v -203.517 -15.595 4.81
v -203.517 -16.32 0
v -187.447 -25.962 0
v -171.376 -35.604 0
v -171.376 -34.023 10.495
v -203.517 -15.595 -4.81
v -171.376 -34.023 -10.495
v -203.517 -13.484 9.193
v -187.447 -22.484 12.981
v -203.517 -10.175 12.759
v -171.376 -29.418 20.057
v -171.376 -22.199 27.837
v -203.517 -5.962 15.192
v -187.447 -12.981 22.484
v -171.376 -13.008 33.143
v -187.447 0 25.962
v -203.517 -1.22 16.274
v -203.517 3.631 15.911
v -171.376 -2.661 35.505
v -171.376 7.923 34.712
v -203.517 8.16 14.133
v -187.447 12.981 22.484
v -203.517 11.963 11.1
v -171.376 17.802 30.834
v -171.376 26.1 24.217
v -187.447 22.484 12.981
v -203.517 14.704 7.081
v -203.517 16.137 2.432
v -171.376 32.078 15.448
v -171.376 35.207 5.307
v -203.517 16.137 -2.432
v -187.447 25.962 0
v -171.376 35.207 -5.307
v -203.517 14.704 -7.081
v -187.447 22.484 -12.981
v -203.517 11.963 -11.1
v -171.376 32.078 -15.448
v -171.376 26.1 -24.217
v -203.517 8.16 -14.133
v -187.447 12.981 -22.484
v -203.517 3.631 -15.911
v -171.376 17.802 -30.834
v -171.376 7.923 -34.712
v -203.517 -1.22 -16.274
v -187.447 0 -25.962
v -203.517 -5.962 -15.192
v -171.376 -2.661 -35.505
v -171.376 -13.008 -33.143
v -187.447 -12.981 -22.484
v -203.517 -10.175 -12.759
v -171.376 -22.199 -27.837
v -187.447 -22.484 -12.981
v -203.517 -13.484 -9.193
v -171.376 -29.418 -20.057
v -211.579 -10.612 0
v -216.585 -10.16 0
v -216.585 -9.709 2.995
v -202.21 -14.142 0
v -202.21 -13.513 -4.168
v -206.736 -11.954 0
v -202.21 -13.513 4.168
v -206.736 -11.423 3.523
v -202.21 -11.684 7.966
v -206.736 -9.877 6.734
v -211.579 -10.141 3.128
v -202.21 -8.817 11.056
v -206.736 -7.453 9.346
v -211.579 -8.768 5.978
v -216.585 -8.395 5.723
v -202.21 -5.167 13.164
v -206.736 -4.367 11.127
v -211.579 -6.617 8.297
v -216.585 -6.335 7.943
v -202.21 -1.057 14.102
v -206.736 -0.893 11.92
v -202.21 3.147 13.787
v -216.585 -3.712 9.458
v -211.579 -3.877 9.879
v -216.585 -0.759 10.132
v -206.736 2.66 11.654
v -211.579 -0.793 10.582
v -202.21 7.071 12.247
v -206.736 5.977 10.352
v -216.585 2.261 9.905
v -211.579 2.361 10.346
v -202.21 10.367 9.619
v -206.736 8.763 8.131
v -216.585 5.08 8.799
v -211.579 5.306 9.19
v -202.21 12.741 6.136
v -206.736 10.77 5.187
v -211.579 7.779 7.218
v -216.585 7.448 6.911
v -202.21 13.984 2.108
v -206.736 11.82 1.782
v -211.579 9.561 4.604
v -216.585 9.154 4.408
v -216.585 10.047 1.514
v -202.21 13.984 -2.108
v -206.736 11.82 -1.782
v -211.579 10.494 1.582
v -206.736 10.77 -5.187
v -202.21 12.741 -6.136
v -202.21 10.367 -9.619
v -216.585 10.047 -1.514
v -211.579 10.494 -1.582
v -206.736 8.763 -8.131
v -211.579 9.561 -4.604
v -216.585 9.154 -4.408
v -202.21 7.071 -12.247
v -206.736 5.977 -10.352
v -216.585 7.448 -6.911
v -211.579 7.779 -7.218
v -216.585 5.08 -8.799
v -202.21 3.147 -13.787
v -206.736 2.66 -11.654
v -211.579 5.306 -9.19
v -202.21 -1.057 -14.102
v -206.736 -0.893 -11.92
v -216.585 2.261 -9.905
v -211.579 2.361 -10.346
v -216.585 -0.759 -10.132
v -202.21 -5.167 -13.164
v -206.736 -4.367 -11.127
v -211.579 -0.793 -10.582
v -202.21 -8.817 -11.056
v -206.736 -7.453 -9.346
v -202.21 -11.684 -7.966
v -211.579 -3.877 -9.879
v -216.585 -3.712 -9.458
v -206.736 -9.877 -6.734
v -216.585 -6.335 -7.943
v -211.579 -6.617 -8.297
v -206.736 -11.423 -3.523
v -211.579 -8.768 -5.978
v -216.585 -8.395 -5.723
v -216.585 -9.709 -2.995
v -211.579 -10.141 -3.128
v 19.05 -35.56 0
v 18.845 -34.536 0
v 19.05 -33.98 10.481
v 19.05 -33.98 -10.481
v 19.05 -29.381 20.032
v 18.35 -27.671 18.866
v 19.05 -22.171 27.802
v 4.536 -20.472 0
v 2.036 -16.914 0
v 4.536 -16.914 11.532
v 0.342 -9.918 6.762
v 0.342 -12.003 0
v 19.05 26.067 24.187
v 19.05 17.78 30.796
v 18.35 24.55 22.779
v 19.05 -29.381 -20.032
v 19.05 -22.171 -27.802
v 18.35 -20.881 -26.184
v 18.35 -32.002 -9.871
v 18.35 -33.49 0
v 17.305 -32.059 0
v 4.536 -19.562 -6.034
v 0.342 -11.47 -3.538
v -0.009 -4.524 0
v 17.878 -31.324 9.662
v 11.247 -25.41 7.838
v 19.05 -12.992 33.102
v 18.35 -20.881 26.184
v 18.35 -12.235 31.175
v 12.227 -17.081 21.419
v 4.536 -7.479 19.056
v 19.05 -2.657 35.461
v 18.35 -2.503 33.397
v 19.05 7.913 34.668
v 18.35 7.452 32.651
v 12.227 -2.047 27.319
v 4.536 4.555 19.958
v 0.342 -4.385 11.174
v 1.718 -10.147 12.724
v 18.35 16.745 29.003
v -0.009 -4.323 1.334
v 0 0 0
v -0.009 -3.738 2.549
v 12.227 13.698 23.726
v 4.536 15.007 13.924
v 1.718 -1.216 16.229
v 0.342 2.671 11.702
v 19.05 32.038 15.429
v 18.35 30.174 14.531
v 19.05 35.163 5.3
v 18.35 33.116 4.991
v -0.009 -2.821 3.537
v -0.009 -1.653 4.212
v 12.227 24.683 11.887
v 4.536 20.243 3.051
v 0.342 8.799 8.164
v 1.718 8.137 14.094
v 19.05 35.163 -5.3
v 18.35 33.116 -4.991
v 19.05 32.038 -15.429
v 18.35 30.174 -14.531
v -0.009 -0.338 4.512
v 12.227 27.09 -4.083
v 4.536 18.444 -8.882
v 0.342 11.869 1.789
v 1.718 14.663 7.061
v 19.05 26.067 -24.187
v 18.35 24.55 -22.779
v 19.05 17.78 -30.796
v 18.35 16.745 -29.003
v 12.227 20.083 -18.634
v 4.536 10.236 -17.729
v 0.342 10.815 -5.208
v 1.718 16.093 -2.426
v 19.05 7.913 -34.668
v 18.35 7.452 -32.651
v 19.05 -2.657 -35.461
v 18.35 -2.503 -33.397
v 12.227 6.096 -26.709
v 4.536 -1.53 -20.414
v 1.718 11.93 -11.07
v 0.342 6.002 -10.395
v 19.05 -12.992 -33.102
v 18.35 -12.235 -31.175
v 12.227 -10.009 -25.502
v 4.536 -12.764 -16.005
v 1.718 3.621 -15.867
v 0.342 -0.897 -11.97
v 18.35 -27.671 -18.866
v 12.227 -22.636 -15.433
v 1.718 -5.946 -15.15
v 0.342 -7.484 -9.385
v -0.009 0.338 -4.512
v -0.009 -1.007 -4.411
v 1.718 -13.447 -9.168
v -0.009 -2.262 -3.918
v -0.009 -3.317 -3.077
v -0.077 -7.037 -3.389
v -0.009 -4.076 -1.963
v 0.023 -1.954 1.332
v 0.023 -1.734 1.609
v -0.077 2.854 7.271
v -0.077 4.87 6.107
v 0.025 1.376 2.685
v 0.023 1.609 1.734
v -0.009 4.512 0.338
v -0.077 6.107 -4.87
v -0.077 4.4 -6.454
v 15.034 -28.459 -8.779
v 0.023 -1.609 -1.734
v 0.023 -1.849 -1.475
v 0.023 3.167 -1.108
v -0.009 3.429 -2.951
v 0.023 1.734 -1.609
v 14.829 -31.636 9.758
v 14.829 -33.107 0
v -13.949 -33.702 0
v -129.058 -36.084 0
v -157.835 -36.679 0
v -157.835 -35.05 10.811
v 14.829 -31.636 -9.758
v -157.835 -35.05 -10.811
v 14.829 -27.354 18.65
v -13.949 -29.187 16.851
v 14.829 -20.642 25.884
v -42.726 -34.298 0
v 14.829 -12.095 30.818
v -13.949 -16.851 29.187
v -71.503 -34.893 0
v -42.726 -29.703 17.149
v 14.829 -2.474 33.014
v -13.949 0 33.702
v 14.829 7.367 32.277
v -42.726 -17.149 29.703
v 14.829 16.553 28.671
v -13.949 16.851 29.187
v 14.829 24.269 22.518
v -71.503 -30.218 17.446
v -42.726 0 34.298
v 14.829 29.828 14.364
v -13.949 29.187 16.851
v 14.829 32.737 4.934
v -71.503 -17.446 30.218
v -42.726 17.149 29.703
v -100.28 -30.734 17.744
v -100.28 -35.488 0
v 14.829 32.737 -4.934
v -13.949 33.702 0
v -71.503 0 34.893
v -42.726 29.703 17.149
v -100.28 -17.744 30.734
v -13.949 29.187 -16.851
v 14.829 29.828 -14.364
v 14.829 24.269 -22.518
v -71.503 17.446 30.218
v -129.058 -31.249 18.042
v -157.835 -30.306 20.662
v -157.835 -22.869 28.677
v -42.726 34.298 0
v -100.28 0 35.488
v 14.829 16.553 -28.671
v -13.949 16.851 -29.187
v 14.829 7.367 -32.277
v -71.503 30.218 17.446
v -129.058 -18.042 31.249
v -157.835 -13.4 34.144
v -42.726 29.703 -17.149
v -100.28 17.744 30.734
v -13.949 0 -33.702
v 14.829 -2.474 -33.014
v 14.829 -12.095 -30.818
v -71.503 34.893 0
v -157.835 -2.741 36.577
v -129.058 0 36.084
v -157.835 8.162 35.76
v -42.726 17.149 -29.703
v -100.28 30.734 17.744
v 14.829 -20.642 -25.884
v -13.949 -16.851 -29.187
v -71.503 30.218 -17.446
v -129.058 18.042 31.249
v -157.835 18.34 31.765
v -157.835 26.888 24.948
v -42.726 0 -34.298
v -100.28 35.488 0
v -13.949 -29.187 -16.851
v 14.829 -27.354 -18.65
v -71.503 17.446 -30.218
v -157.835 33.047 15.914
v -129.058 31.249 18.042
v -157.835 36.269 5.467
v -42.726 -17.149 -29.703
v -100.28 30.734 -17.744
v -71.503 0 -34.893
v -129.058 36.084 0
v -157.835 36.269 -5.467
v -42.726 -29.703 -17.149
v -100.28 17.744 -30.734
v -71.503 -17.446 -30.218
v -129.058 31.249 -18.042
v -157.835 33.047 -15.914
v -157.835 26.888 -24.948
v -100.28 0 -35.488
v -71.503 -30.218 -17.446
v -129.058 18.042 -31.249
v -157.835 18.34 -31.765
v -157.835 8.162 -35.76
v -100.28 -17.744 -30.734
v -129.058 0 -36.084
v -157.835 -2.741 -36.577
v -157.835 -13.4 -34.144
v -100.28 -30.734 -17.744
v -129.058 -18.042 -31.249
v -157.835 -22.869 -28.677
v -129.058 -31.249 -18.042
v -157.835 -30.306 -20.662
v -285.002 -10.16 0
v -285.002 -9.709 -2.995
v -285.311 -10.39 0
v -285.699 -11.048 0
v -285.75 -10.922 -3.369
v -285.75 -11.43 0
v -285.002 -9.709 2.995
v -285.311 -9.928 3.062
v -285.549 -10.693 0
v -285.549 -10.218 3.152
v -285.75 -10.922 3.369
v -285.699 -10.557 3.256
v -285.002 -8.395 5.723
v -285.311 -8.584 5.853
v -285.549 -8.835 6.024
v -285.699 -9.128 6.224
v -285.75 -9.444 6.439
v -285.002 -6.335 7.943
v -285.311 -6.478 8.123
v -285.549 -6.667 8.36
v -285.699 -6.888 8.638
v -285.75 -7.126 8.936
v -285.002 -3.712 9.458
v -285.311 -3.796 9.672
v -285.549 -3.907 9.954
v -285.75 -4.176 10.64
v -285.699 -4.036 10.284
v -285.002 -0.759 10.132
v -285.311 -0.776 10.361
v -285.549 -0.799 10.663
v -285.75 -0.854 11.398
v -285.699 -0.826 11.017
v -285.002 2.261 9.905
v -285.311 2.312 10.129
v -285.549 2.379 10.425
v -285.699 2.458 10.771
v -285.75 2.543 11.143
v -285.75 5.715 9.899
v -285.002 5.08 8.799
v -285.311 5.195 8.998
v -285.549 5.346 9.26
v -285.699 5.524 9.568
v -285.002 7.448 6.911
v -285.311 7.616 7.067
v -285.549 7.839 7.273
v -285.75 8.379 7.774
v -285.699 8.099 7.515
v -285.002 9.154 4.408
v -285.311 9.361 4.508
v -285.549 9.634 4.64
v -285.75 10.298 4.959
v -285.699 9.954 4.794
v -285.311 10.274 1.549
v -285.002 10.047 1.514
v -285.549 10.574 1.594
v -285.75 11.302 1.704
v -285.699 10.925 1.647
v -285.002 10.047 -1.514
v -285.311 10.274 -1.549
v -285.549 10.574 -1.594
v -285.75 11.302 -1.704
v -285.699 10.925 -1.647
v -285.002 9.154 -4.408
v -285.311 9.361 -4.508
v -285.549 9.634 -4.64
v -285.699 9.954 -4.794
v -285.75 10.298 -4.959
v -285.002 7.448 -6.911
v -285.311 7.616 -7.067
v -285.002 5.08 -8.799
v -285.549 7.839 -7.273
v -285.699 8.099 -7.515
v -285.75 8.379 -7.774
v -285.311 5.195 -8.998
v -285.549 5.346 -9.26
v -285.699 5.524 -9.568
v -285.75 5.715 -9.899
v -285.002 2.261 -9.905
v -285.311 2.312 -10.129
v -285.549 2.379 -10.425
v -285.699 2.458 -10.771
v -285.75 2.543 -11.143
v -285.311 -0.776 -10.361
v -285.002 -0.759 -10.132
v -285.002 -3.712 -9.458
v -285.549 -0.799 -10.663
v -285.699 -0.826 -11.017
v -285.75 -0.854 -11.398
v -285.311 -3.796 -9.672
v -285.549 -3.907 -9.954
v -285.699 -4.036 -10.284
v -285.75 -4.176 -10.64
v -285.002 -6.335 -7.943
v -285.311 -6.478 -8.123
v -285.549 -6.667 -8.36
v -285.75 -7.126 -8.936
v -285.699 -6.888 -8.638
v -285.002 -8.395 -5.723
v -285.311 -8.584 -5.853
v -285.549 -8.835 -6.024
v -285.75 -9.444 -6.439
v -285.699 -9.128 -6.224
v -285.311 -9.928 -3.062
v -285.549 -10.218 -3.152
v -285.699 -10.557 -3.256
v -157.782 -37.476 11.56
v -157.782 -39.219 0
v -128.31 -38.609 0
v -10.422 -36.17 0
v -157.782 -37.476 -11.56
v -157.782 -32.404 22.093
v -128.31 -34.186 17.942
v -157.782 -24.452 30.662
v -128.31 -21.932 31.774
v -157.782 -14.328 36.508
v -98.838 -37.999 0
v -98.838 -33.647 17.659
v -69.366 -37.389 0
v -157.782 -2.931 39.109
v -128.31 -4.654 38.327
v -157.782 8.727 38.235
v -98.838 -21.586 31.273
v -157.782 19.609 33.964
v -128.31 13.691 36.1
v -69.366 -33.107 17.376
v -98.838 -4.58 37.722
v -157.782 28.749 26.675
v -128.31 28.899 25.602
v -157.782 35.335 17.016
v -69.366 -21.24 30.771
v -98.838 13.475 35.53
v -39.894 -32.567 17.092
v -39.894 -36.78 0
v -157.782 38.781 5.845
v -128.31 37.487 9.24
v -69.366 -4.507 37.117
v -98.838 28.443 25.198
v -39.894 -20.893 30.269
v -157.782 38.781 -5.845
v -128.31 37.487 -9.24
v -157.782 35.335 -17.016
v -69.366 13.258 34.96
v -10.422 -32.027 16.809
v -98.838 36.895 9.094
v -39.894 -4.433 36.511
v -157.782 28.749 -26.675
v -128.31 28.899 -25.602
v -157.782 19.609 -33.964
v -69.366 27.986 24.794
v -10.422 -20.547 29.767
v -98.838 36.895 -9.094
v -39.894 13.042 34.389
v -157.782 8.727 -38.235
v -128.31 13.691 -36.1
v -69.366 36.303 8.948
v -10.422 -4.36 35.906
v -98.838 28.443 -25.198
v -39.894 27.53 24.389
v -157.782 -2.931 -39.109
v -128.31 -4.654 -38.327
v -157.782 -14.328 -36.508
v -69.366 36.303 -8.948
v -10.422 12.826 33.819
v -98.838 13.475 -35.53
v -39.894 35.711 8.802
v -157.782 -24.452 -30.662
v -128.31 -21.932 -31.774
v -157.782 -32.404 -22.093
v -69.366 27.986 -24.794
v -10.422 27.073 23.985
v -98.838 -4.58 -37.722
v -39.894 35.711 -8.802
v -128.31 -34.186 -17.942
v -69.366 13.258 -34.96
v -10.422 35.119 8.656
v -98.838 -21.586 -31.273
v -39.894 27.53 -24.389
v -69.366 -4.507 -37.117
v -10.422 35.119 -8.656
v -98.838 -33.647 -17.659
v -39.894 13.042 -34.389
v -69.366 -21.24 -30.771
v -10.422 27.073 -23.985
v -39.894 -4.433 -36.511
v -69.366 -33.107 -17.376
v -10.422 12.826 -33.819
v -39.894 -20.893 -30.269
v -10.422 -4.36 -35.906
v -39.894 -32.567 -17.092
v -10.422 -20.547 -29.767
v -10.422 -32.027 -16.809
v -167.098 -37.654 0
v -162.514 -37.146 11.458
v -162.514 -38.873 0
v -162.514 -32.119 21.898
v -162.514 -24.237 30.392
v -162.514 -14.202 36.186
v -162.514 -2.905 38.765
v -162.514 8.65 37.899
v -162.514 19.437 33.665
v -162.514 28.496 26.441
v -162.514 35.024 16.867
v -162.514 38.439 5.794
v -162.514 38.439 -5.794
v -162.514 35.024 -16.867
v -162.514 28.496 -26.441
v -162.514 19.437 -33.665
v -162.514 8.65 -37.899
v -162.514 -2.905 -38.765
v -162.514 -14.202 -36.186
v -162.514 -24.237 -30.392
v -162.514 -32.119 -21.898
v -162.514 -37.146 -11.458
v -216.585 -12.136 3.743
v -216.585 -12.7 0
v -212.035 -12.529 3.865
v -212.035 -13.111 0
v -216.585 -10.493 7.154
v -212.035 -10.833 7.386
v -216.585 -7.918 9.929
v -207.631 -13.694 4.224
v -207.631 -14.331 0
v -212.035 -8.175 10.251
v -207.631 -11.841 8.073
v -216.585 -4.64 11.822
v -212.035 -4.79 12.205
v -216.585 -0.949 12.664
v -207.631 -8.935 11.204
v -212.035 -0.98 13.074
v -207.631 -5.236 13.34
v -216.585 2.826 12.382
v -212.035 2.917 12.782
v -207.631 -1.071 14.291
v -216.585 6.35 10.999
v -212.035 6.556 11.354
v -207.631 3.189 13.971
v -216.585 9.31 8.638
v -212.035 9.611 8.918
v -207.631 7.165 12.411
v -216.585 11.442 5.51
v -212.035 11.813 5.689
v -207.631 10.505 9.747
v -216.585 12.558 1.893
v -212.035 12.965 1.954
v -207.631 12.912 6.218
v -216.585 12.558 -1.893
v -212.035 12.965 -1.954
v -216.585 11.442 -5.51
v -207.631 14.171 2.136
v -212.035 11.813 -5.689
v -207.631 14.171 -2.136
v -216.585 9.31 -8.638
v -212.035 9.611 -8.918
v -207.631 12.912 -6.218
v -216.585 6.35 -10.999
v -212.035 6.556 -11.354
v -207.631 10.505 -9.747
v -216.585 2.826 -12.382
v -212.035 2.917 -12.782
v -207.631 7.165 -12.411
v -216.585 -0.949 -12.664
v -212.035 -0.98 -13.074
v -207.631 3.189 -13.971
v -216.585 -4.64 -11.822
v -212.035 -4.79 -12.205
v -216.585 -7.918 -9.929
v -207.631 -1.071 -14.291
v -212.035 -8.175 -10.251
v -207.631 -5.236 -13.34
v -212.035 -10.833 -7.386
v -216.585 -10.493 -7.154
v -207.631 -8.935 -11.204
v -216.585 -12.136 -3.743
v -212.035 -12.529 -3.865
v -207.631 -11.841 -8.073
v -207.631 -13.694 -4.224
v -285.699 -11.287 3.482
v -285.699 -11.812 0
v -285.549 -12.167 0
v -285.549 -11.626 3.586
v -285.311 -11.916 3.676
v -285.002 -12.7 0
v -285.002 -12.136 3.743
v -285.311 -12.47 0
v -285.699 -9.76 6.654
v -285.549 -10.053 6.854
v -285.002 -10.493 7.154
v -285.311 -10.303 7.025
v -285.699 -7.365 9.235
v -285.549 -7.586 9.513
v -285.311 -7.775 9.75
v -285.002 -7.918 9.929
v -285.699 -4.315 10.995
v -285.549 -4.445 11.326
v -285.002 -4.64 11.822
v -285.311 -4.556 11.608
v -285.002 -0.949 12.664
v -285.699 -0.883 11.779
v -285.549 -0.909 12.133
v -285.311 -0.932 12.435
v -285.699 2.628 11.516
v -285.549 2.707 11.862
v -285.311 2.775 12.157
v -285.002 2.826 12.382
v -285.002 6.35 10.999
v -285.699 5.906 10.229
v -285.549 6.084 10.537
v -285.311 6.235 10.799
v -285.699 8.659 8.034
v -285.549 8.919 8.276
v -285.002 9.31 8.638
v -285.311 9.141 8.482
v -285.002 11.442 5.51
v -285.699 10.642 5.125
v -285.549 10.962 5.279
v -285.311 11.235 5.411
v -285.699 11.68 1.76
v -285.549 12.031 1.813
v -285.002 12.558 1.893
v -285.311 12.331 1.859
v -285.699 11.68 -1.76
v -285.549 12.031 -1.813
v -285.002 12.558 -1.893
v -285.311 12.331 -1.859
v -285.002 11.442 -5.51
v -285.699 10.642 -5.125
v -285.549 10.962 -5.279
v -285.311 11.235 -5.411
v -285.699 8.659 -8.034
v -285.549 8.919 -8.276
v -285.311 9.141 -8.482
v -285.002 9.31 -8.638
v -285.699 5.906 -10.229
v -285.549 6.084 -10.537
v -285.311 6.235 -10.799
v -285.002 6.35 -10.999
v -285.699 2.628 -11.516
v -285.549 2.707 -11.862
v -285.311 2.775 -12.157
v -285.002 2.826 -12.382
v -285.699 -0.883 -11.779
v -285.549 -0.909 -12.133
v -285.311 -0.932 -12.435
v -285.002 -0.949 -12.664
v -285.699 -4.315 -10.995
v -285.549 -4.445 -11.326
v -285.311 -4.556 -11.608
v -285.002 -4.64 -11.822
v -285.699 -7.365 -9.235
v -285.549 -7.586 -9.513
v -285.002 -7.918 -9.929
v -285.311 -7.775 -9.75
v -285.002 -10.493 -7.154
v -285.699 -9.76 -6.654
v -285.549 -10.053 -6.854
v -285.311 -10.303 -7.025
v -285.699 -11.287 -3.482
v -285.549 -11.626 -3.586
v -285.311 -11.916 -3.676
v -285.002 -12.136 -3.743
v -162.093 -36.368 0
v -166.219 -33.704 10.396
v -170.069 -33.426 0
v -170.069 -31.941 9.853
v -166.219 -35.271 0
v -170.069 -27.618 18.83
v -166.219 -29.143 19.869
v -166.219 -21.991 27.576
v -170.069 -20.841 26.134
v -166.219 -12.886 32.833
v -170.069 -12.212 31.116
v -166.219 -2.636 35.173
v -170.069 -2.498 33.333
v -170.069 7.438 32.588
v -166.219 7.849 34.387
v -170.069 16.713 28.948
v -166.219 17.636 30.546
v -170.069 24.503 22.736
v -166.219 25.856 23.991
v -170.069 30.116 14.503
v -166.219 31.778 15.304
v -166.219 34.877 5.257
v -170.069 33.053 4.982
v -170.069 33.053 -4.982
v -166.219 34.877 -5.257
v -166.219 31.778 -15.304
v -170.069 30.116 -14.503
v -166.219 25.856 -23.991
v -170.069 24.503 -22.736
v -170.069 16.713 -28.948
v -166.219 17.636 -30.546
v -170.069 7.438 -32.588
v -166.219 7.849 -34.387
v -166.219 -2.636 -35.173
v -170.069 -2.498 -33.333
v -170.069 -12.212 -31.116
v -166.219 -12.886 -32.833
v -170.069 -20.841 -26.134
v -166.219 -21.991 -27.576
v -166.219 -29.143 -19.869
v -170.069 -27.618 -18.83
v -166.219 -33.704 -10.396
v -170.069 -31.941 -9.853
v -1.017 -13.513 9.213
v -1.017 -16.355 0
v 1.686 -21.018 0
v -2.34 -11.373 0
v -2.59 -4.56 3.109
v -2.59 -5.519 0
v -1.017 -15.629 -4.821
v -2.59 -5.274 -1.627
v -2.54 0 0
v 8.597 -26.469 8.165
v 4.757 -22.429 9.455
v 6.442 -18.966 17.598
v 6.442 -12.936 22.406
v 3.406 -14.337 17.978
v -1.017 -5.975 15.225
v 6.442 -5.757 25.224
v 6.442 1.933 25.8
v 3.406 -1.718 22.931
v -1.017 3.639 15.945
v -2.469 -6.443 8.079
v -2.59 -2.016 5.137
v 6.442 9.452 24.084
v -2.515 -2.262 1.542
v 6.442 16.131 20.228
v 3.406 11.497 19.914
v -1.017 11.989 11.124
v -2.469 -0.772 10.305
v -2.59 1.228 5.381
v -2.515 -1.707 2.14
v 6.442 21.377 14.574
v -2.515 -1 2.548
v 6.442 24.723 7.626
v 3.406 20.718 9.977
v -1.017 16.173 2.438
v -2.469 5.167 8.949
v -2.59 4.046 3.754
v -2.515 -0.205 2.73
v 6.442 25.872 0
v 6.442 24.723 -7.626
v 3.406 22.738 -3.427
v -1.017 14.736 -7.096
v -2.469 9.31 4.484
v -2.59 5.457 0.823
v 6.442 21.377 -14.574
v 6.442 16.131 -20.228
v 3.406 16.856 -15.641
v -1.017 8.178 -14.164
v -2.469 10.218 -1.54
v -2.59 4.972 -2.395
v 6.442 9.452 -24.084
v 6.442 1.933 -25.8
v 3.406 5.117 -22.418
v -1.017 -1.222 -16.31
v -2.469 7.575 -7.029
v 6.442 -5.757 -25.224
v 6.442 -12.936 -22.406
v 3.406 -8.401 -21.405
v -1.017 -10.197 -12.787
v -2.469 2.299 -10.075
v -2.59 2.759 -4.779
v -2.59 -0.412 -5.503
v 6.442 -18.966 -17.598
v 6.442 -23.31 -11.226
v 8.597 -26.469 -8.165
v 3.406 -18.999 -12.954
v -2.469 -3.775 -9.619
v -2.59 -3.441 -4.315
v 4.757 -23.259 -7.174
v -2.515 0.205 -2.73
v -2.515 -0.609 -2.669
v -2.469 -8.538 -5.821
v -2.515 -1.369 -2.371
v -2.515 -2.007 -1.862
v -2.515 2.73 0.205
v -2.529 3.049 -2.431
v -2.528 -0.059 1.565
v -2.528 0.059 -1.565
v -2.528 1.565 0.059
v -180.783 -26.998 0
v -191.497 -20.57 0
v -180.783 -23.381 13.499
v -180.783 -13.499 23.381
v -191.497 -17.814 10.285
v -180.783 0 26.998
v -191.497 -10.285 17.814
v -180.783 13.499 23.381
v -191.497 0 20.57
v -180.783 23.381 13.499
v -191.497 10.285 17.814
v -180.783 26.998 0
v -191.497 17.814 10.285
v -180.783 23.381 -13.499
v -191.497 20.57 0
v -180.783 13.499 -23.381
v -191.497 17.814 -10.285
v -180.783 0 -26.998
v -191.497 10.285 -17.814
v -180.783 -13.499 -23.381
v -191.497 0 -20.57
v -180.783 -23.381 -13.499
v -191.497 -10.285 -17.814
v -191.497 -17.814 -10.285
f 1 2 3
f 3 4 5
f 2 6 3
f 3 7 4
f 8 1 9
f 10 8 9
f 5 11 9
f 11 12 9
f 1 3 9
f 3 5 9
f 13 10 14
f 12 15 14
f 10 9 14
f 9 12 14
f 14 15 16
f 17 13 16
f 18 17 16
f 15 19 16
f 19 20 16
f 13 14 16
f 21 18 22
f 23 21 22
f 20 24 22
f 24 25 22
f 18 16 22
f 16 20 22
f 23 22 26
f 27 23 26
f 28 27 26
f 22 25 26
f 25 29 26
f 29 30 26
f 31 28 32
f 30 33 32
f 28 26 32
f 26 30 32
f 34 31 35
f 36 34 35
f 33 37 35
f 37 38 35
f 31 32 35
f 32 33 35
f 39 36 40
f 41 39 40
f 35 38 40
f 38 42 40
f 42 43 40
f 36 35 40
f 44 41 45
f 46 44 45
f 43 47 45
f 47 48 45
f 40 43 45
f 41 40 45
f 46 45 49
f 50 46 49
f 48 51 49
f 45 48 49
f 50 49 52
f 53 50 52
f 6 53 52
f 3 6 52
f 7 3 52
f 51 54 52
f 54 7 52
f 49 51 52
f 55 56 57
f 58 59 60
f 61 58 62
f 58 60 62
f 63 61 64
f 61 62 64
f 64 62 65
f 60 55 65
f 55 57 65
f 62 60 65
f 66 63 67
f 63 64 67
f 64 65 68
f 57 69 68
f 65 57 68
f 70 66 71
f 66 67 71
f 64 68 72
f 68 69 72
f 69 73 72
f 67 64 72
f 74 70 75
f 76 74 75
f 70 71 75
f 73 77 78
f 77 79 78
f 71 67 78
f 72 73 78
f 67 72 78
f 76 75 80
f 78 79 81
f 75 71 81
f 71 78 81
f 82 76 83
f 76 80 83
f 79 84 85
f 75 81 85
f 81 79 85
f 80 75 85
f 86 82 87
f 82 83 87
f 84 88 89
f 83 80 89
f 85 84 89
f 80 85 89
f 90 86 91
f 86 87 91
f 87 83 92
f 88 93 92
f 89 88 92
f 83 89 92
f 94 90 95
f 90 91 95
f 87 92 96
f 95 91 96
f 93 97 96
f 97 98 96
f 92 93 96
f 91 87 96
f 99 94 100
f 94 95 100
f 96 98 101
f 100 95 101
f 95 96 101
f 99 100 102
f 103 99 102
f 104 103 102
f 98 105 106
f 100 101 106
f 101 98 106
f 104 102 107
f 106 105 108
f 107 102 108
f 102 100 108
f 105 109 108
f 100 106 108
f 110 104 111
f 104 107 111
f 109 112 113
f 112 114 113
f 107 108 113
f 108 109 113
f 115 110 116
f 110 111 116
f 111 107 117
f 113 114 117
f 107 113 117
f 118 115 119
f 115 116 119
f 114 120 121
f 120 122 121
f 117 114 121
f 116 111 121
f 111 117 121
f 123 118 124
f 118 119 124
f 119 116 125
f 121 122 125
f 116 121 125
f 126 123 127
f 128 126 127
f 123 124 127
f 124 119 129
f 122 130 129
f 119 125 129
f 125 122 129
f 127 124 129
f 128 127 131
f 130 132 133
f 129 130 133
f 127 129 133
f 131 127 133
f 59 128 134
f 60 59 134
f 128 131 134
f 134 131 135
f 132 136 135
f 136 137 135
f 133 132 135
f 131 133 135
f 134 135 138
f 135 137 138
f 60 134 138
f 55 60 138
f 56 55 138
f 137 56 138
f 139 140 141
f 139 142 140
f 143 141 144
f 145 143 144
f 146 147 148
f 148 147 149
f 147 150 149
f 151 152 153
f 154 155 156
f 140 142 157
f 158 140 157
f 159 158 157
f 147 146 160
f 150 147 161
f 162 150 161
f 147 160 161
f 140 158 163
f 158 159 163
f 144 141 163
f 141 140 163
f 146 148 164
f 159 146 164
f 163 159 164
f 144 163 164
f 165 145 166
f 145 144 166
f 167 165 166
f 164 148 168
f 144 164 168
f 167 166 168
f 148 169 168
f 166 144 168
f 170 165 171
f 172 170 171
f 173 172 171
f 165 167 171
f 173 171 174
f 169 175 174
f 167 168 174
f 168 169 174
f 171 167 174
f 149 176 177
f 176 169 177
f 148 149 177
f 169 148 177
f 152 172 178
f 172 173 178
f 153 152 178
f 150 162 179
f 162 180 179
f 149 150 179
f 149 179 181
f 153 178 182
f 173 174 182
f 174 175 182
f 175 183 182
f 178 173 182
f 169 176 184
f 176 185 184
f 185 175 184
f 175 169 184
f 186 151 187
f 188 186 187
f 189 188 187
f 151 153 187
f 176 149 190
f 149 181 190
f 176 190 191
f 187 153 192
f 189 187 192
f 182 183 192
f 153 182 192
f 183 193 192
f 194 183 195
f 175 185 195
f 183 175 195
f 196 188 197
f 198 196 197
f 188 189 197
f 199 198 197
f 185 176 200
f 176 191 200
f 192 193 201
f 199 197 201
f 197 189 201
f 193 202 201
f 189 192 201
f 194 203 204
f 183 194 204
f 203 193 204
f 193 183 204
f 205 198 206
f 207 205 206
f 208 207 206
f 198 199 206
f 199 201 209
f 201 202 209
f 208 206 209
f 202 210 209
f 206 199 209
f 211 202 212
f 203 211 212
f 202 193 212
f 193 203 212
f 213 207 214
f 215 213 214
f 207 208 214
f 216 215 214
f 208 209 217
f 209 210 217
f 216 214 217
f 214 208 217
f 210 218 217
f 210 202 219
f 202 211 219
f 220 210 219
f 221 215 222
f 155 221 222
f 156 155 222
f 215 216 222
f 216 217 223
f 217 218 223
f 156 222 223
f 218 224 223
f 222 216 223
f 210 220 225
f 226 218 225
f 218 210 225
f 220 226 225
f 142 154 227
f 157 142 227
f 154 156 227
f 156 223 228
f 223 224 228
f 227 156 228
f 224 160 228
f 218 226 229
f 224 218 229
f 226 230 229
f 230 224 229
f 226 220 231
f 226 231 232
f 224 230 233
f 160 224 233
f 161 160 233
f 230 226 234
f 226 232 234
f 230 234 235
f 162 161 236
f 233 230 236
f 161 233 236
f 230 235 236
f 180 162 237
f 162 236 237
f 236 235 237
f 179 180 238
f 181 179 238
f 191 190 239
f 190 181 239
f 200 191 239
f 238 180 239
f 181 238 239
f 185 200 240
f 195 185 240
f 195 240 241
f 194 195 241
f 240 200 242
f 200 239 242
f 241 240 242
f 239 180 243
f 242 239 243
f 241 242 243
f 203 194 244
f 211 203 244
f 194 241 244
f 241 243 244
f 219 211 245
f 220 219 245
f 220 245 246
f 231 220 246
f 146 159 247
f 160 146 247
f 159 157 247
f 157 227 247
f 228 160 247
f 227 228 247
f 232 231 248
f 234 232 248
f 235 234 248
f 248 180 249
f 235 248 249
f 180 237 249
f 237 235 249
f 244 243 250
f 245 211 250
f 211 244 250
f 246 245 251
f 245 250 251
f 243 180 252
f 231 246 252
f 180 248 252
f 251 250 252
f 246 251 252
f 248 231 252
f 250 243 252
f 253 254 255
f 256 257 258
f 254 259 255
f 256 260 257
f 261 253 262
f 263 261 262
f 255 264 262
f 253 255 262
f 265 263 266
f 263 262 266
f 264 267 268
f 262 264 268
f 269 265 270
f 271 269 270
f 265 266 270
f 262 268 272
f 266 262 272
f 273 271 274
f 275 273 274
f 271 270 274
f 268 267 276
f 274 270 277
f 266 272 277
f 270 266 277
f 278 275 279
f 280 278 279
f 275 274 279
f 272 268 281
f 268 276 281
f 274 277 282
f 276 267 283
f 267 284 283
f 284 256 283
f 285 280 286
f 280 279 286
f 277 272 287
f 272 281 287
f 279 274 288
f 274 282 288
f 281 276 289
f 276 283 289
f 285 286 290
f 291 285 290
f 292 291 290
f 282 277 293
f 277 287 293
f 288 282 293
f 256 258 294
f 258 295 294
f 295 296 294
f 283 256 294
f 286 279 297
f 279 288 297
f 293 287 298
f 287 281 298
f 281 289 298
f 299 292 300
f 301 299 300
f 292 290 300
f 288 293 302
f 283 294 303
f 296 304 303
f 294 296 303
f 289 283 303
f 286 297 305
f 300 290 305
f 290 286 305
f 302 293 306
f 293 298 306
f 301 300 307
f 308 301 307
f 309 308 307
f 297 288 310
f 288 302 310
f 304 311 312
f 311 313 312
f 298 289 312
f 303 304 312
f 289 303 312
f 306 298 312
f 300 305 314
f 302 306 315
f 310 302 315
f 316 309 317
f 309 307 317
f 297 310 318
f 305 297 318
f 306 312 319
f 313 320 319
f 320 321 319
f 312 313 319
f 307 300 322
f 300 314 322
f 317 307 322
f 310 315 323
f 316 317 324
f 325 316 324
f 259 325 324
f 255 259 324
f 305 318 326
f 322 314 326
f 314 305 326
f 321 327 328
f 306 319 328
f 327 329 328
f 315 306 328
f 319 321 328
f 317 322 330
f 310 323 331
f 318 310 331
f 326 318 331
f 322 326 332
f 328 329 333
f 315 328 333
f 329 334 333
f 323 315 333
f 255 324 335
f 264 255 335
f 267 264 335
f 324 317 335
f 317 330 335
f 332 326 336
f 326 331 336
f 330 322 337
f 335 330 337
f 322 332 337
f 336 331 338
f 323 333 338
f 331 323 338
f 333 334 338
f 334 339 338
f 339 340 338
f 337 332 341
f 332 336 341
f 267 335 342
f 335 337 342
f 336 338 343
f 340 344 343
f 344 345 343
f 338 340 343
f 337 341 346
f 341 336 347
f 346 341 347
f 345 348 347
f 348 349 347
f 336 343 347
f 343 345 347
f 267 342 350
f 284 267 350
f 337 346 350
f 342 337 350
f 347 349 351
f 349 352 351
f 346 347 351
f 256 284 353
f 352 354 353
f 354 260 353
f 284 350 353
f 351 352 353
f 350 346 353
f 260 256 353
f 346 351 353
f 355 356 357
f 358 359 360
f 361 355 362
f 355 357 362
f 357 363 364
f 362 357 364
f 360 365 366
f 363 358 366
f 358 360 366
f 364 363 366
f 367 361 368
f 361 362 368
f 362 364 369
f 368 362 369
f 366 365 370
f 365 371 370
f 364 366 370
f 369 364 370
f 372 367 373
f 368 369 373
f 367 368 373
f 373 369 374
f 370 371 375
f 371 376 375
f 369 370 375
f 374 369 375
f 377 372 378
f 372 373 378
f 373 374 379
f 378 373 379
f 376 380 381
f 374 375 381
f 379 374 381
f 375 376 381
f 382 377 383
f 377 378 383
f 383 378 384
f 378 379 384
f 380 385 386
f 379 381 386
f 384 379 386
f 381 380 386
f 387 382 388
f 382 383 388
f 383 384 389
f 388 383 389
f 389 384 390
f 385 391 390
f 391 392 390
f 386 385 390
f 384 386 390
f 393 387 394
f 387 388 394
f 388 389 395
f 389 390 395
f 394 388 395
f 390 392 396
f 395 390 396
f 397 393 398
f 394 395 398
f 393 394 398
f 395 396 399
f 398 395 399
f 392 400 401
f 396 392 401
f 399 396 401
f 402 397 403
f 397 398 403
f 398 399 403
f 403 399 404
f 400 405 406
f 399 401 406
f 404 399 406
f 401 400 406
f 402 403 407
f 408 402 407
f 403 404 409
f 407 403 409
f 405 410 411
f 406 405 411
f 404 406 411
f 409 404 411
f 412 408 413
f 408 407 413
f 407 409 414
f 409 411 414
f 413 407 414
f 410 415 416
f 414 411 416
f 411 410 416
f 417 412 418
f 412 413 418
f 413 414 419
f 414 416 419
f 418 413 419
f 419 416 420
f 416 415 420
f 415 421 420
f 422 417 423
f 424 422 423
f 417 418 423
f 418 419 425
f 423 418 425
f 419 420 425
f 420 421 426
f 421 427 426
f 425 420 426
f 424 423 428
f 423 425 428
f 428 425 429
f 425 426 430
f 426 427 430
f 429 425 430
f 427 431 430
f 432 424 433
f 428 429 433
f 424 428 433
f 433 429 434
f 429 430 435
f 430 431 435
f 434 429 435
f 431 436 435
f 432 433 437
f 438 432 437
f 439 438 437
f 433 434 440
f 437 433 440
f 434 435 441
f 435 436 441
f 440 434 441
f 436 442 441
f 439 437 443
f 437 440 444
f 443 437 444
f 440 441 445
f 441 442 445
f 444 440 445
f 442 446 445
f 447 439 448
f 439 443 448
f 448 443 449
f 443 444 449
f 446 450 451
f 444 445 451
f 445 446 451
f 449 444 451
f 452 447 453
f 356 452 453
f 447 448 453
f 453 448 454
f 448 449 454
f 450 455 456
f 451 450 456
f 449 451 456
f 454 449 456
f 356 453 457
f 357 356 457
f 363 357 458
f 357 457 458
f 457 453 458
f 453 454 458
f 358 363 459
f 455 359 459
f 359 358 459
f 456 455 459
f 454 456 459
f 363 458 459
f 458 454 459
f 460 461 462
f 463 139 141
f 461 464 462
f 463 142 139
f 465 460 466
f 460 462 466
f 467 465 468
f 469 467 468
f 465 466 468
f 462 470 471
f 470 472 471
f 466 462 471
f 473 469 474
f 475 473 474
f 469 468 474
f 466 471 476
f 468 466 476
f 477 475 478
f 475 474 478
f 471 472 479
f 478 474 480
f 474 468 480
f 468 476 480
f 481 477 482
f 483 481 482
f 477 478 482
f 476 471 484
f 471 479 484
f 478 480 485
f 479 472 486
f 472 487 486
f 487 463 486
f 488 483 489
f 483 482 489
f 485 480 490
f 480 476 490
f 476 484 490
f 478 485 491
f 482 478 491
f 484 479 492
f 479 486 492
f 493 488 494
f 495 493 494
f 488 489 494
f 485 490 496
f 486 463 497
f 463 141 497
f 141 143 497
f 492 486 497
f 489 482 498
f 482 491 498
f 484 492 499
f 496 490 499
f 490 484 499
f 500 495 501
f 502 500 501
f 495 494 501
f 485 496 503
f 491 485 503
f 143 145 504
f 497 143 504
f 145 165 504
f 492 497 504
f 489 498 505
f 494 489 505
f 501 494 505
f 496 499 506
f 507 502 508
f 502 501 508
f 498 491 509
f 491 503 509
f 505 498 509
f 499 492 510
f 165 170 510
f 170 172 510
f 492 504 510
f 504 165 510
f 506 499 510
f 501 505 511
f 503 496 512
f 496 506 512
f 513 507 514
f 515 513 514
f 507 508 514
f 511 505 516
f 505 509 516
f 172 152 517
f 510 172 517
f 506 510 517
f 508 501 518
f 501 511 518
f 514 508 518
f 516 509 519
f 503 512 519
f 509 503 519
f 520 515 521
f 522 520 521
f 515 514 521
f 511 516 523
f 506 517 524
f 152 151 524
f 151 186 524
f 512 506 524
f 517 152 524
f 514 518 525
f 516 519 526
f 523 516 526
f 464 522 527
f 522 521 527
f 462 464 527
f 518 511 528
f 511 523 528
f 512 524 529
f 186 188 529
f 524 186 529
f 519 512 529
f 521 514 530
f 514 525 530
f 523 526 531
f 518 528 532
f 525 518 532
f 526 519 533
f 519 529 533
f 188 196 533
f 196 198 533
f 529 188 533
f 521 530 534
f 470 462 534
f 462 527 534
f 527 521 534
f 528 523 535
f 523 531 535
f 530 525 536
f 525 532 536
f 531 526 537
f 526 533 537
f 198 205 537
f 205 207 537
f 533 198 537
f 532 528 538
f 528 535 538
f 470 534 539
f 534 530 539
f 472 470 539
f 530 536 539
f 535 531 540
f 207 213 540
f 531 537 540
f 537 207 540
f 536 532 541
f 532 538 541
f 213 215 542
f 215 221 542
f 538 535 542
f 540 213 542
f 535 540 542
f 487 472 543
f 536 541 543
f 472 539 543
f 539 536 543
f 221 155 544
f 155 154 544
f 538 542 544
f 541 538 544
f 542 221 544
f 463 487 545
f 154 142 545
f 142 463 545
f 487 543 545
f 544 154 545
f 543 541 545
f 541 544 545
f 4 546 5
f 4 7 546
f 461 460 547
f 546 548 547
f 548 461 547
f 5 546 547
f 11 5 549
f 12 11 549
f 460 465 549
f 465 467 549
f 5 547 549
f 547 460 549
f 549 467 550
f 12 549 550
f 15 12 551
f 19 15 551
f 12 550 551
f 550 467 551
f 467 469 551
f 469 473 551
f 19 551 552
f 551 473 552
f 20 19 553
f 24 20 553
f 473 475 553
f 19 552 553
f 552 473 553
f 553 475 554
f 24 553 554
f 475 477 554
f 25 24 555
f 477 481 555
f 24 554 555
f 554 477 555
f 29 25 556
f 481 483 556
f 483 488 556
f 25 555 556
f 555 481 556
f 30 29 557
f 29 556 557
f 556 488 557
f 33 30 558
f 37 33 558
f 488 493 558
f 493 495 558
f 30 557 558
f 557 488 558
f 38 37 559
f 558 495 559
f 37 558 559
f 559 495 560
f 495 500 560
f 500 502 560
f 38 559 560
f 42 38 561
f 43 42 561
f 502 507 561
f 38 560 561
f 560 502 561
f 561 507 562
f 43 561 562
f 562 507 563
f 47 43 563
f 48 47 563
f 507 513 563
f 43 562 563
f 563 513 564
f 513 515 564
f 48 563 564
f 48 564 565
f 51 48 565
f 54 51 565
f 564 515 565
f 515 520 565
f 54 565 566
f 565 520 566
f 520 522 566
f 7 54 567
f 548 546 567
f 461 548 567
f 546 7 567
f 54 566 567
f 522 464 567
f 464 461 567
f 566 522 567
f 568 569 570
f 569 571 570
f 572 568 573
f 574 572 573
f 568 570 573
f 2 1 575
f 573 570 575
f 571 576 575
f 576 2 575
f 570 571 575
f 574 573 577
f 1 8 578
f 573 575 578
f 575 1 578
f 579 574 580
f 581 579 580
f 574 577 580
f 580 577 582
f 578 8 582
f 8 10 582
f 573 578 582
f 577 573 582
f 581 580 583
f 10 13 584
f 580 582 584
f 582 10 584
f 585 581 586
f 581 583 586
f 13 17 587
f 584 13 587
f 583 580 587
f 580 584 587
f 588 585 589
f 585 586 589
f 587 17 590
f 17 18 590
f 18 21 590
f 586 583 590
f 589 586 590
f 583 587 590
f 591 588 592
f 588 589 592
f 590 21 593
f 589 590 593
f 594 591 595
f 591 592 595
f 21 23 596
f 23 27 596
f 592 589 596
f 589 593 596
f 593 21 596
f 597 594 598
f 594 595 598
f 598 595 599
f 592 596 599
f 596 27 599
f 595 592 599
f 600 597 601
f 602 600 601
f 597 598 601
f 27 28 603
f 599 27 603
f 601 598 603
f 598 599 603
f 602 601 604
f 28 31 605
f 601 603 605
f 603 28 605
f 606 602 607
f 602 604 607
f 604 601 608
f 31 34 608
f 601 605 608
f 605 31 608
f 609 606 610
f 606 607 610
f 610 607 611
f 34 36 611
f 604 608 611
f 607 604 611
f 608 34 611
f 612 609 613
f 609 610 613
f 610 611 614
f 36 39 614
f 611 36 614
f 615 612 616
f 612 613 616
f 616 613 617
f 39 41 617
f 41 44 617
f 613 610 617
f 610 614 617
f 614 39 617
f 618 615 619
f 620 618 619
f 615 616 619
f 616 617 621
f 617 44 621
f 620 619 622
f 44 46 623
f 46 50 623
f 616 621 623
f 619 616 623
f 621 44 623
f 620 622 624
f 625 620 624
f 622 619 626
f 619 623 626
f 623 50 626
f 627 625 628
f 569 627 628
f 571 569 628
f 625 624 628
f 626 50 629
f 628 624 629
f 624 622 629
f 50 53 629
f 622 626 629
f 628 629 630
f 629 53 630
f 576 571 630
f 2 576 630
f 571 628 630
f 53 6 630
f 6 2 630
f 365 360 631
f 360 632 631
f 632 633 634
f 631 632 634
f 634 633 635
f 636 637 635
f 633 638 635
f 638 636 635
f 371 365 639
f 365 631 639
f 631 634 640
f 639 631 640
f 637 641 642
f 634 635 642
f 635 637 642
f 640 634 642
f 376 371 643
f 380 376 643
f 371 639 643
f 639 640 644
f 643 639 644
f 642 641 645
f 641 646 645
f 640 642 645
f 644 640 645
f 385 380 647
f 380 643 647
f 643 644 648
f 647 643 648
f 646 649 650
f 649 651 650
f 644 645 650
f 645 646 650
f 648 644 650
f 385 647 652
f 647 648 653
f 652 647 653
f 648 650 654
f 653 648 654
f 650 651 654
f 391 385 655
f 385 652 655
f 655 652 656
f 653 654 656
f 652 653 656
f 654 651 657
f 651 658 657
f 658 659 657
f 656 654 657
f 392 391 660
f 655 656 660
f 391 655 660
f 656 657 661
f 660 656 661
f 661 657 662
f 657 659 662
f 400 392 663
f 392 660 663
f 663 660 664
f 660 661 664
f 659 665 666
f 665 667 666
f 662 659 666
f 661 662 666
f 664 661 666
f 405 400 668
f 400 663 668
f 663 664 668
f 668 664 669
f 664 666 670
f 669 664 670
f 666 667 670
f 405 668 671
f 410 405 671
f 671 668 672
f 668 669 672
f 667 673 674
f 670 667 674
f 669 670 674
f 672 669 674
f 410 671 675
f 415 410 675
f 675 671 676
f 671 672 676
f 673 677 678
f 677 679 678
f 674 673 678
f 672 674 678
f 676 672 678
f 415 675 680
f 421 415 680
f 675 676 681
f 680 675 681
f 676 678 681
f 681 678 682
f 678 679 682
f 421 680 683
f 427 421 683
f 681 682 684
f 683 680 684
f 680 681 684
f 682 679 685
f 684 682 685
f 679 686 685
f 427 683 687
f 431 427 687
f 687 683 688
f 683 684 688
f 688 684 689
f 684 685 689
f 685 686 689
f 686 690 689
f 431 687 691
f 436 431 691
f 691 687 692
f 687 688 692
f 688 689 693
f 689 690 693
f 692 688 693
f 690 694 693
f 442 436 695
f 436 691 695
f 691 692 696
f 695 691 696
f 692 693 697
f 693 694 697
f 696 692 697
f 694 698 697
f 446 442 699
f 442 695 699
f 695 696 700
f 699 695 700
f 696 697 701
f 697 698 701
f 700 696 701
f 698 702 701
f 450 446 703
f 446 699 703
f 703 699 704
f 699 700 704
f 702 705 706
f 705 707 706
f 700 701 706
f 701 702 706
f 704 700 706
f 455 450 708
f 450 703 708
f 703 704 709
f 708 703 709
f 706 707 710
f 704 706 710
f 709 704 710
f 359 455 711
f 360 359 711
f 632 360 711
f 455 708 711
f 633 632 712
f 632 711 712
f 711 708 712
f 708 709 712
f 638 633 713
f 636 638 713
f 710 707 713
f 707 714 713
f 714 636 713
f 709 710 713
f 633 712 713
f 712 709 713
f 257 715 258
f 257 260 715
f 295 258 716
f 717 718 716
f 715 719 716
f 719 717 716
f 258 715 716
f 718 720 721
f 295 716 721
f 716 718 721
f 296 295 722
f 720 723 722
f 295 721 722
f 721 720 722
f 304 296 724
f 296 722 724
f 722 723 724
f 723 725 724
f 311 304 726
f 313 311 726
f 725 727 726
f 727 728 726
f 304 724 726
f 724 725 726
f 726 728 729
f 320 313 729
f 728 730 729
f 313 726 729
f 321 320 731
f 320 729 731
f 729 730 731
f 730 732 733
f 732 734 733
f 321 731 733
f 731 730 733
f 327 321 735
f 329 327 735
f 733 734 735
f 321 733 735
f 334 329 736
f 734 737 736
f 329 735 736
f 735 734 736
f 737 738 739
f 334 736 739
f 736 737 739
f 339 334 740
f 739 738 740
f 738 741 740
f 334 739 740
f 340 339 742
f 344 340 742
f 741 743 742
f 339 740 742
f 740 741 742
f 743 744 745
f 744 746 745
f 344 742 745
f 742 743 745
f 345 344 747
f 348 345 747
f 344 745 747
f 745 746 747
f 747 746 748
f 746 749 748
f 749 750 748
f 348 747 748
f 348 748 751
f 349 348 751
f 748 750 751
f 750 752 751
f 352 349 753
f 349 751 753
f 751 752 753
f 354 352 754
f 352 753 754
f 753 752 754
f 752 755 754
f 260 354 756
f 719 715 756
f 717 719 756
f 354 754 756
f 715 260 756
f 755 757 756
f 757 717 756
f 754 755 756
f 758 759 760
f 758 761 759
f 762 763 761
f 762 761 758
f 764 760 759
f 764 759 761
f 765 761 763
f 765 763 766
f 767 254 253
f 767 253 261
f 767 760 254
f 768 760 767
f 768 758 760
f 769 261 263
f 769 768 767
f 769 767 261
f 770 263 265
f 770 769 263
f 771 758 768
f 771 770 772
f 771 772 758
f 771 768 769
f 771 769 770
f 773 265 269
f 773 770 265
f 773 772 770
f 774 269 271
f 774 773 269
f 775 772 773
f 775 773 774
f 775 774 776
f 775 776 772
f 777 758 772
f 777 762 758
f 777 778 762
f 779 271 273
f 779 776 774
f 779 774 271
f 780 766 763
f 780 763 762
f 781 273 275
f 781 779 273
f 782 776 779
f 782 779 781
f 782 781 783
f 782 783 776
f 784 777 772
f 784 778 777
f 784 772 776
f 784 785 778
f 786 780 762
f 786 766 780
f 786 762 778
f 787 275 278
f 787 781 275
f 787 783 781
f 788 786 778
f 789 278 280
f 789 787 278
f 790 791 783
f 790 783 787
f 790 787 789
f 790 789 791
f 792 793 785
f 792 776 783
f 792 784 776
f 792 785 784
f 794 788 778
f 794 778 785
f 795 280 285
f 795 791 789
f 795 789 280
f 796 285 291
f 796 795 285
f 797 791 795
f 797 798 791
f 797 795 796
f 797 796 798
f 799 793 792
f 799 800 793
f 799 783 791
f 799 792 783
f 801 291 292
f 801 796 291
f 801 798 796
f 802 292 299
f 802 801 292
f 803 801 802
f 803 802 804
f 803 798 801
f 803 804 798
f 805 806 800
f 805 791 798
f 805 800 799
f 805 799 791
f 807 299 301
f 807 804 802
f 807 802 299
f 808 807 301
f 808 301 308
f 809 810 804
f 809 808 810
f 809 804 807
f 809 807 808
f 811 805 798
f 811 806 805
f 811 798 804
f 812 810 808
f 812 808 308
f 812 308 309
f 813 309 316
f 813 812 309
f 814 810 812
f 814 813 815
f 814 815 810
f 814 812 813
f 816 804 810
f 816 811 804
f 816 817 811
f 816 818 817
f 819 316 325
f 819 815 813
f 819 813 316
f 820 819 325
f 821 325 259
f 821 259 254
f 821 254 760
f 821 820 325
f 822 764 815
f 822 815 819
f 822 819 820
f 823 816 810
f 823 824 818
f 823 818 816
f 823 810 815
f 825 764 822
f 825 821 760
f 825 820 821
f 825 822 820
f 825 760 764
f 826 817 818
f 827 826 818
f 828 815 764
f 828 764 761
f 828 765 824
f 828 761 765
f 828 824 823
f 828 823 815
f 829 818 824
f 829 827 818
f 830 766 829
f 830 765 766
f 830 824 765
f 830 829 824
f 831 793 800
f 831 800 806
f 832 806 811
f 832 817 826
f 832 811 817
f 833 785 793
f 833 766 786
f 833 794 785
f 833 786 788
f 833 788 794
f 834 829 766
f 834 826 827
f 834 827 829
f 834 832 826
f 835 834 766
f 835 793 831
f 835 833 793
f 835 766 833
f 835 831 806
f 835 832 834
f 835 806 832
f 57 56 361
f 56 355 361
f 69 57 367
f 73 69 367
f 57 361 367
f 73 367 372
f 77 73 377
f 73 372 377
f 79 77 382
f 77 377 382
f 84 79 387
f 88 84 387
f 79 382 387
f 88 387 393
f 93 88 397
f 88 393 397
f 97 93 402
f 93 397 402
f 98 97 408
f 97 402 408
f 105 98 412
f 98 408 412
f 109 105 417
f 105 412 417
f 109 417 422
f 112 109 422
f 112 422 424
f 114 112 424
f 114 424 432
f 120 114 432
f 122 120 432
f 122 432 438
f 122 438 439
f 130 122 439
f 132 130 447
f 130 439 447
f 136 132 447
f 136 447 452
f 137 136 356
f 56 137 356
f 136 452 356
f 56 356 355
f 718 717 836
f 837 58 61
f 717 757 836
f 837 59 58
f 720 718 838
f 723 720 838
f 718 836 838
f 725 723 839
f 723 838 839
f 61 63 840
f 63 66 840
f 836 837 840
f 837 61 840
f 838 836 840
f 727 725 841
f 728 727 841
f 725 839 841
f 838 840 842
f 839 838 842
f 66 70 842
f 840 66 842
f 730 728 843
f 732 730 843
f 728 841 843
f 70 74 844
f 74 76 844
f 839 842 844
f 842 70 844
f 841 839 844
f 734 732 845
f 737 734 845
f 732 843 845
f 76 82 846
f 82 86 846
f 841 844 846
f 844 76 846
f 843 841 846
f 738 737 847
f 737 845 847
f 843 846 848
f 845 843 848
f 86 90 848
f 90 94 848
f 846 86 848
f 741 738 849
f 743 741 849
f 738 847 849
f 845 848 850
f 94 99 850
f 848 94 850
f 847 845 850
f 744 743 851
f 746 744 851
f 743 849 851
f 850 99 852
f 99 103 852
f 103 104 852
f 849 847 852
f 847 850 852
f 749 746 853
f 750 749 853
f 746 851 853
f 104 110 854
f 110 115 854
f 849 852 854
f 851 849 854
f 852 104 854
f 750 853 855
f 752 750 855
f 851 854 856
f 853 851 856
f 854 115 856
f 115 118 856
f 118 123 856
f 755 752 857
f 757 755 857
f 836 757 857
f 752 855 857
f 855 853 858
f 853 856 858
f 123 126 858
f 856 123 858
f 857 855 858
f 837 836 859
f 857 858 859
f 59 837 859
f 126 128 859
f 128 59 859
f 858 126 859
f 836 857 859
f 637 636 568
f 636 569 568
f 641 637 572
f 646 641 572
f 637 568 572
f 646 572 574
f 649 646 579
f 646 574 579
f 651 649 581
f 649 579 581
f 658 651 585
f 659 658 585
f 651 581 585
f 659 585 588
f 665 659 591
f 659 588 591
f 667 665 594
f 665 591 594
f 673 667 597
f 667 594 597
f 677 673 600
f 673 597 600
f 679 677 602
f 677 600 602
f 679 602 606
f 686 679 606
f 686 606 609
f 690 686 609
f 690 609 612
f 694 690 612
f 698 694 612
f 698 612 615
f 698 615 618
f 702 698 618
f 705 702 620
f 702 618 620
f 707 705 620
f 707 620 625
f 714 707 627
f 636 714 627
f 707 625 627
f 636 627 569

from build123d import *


# Not quite as in the source:
# - ends of sketch curves that miss each other by under 0.0002 mm in the source are joined
# - the dataset's text gives a spline's control points without its knots; the knots are read off the source's solid


with BuildPart() as f1:
    # F0 (on Top) → F1 (revolve)
    with BuildSketch(Plane.XY):
        with BuildLine():
            ThreePointArc((-285.75, -11.43), (-285.5490287786, -12.167016937), (-285.0017514707, -12.7))
            Line((-285.0017514707, -12.7), (-216.5853927097, -12.7))
            ThreePointArc((-216.5853927097, -12.7), (-209.8052797295, -13.6216408234), (-203.5172005218, -16.3196796869))
            Line((-203.5172005218, -16.3196796869), (-171.3760702521, -35.6043578488))
            ThreePointArc((-171.3760702521, -35.6043578488), (-164.8344445945, -38.3712151601), (-157.7824732637, -39.2186028951))
            Line((-157.7824732637, -39.2186028951), (19.05, -35.56))
            add(Edge.make_bspline(
                [(19.05, -35.56), (18.8199370568, -30.7601188197), (-1.2317807445, -20.8787296757), (0.1635549587, -4.0029242831), (-5.1918e-06, -1.9625883677), (0, 0)],
                knots=[0, 0, 0, 0, 0.4507733435, 0.8068049822, 1, 1, 1, 1], degree=3))
            Line((0, 0), (-2.54, 0))
            add(Edge.make_bspline(
                [(14.8285794135, -33.1067947702), (14.5353050036, -32.7990607261), (13.8691865137, -32.1447406693), (12.2944674544, -30.73758966), (9.9695334737, -28.8275639769), (7.4490348824, -26.7626250066), (5.4570185152, -25.0088190546), (4.0093053584, -23.6366363216), (2.641510283, -22.1980089148), (1.5988268496, -20.9351240128), (0.8394327936, -19.8719511734), (0.1492382006, -18.7893744625), (-0.5810765462, -17.4218736538), (-1.2672380096, -15.7774032099), (-1.9564088602, -13.6109085126), (-2.4520800573, -11.0014246266), (-2.6128292518, -8.638851289), (-2.627993734, -6.9624293235), (-2.6035900901, -5.8300997647), (-2.5708007223, -5.0090073669), (-2.547044183, -4.4386671163), (-2.5331221367, -4.0633936667), (-2.5236240841, -3.723792553), (-2.5156422476, -3.3057754423), (-2.5131648633, -2.8291110855), (-2.5181696061, -2.2621652533), (-2.530667923, -1.4312861782), (-2.5400016792, -0.6509680927), (-2.54, 0)],
                knots=[0.1260546343, 0.1260546343, 0.1260546343, 0.1260546343, 0.15625, 0.1875, 0.25, 0.3125, 0.34375, 0.375, 0.40625, 0.4375, 0.453125, 0.46875, 0.5, 0.53125, 0.5625, 0.625, 0.6875, 0.71875, 0.75, 0.78125, 0.796875, 0.8125, 0.828125, 0.84375, 0.875, 0.90625, 0.9375, 0.999999785, 0.999999785, 0.999999785, 0.999999785], degree=3))
            Line((14.8285794135, -33.1067947702), (-157.8350137437, -36.6791463592))
            ThreePointArc((-157.8350137437, -36.6791463592), (-164.1817879415, -35.9164973976), (-170.0692510333, -33.4263258174))
            Line((-170.0692510333, -33.4263258174), (-202.210381303, -14.1416476556))
            ThreePointArc((-202.210381303, -14.1416476556), (-209.1272684315, -11.1738049058), (-216.5853927097, -10.16))
            Line((-216.5853927097, -10.16), (-285.0017514707, -10.16))
            ThreePointArc((-285.0017514707, -10.16), (-285.5490287786, -10.692983063), (-285.75, -11.43))
        make_face()
    revolve(axis=Axis((-142.875, 0, 0), (-1, 0, 0)))


solid = f1.part
